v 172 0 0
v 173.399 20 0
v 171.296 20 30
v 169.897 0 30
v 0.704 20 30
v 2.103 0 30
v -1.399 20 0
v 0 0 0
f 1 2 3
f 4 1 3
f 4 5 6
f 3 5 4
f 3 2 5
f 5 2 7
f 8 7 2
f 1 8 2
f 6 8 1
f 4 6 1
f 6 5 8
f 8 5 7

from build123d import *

# Parameters (mm, degrees)
F1_DEPTH = 30
F4_DEPTH = 27.7
F7_DEPTH = 50.2


with BuildPart() as f1:
    # F0 (on Top) → F1 (new body)
    with BuildSketch(Plane.XY):
        Polygon((-1.3985362389, 20), (0, 0), (172, 0), (173.3985362389, 20), align=None)
    extrude(amount=F1_DEPTH)

    # F3 (on face) → F4 (cut, symmetric)
    with BuildSketch(Plane(origin=(0, 0, 0), x_dir=(-0.9975640503, -0.0697564737, 0), z_dir=(-0.0697564737, 0.9975640503, 0))):
        Polygon((-2.4909883108, 35.6227924818), (0, 0), (0, 35.6227924818), align=None)
    extrude(amount=F4_DEPTH, both=True, mode=Mode.SUBTRACT)

    # F6 (on face) → F7 (cut, symmetric)
    with BuildSketch(Plane(origin=(0.8369460882, 11.9688866826, 0), x_dir=(-0.9975640503, 0.0697564737, 0), z_dir=(0.0697564737, 0.9975640503, 0))):
        Polygon((-171.5810166447, 89.9730579068), (-171.5810166447, 0), (-165.3201019088, 89.5352520994), align=None)
    extrude(amount=F7_DEPTH, both=True, mode=Mode.SUBTRACT)


solid = f1.part
